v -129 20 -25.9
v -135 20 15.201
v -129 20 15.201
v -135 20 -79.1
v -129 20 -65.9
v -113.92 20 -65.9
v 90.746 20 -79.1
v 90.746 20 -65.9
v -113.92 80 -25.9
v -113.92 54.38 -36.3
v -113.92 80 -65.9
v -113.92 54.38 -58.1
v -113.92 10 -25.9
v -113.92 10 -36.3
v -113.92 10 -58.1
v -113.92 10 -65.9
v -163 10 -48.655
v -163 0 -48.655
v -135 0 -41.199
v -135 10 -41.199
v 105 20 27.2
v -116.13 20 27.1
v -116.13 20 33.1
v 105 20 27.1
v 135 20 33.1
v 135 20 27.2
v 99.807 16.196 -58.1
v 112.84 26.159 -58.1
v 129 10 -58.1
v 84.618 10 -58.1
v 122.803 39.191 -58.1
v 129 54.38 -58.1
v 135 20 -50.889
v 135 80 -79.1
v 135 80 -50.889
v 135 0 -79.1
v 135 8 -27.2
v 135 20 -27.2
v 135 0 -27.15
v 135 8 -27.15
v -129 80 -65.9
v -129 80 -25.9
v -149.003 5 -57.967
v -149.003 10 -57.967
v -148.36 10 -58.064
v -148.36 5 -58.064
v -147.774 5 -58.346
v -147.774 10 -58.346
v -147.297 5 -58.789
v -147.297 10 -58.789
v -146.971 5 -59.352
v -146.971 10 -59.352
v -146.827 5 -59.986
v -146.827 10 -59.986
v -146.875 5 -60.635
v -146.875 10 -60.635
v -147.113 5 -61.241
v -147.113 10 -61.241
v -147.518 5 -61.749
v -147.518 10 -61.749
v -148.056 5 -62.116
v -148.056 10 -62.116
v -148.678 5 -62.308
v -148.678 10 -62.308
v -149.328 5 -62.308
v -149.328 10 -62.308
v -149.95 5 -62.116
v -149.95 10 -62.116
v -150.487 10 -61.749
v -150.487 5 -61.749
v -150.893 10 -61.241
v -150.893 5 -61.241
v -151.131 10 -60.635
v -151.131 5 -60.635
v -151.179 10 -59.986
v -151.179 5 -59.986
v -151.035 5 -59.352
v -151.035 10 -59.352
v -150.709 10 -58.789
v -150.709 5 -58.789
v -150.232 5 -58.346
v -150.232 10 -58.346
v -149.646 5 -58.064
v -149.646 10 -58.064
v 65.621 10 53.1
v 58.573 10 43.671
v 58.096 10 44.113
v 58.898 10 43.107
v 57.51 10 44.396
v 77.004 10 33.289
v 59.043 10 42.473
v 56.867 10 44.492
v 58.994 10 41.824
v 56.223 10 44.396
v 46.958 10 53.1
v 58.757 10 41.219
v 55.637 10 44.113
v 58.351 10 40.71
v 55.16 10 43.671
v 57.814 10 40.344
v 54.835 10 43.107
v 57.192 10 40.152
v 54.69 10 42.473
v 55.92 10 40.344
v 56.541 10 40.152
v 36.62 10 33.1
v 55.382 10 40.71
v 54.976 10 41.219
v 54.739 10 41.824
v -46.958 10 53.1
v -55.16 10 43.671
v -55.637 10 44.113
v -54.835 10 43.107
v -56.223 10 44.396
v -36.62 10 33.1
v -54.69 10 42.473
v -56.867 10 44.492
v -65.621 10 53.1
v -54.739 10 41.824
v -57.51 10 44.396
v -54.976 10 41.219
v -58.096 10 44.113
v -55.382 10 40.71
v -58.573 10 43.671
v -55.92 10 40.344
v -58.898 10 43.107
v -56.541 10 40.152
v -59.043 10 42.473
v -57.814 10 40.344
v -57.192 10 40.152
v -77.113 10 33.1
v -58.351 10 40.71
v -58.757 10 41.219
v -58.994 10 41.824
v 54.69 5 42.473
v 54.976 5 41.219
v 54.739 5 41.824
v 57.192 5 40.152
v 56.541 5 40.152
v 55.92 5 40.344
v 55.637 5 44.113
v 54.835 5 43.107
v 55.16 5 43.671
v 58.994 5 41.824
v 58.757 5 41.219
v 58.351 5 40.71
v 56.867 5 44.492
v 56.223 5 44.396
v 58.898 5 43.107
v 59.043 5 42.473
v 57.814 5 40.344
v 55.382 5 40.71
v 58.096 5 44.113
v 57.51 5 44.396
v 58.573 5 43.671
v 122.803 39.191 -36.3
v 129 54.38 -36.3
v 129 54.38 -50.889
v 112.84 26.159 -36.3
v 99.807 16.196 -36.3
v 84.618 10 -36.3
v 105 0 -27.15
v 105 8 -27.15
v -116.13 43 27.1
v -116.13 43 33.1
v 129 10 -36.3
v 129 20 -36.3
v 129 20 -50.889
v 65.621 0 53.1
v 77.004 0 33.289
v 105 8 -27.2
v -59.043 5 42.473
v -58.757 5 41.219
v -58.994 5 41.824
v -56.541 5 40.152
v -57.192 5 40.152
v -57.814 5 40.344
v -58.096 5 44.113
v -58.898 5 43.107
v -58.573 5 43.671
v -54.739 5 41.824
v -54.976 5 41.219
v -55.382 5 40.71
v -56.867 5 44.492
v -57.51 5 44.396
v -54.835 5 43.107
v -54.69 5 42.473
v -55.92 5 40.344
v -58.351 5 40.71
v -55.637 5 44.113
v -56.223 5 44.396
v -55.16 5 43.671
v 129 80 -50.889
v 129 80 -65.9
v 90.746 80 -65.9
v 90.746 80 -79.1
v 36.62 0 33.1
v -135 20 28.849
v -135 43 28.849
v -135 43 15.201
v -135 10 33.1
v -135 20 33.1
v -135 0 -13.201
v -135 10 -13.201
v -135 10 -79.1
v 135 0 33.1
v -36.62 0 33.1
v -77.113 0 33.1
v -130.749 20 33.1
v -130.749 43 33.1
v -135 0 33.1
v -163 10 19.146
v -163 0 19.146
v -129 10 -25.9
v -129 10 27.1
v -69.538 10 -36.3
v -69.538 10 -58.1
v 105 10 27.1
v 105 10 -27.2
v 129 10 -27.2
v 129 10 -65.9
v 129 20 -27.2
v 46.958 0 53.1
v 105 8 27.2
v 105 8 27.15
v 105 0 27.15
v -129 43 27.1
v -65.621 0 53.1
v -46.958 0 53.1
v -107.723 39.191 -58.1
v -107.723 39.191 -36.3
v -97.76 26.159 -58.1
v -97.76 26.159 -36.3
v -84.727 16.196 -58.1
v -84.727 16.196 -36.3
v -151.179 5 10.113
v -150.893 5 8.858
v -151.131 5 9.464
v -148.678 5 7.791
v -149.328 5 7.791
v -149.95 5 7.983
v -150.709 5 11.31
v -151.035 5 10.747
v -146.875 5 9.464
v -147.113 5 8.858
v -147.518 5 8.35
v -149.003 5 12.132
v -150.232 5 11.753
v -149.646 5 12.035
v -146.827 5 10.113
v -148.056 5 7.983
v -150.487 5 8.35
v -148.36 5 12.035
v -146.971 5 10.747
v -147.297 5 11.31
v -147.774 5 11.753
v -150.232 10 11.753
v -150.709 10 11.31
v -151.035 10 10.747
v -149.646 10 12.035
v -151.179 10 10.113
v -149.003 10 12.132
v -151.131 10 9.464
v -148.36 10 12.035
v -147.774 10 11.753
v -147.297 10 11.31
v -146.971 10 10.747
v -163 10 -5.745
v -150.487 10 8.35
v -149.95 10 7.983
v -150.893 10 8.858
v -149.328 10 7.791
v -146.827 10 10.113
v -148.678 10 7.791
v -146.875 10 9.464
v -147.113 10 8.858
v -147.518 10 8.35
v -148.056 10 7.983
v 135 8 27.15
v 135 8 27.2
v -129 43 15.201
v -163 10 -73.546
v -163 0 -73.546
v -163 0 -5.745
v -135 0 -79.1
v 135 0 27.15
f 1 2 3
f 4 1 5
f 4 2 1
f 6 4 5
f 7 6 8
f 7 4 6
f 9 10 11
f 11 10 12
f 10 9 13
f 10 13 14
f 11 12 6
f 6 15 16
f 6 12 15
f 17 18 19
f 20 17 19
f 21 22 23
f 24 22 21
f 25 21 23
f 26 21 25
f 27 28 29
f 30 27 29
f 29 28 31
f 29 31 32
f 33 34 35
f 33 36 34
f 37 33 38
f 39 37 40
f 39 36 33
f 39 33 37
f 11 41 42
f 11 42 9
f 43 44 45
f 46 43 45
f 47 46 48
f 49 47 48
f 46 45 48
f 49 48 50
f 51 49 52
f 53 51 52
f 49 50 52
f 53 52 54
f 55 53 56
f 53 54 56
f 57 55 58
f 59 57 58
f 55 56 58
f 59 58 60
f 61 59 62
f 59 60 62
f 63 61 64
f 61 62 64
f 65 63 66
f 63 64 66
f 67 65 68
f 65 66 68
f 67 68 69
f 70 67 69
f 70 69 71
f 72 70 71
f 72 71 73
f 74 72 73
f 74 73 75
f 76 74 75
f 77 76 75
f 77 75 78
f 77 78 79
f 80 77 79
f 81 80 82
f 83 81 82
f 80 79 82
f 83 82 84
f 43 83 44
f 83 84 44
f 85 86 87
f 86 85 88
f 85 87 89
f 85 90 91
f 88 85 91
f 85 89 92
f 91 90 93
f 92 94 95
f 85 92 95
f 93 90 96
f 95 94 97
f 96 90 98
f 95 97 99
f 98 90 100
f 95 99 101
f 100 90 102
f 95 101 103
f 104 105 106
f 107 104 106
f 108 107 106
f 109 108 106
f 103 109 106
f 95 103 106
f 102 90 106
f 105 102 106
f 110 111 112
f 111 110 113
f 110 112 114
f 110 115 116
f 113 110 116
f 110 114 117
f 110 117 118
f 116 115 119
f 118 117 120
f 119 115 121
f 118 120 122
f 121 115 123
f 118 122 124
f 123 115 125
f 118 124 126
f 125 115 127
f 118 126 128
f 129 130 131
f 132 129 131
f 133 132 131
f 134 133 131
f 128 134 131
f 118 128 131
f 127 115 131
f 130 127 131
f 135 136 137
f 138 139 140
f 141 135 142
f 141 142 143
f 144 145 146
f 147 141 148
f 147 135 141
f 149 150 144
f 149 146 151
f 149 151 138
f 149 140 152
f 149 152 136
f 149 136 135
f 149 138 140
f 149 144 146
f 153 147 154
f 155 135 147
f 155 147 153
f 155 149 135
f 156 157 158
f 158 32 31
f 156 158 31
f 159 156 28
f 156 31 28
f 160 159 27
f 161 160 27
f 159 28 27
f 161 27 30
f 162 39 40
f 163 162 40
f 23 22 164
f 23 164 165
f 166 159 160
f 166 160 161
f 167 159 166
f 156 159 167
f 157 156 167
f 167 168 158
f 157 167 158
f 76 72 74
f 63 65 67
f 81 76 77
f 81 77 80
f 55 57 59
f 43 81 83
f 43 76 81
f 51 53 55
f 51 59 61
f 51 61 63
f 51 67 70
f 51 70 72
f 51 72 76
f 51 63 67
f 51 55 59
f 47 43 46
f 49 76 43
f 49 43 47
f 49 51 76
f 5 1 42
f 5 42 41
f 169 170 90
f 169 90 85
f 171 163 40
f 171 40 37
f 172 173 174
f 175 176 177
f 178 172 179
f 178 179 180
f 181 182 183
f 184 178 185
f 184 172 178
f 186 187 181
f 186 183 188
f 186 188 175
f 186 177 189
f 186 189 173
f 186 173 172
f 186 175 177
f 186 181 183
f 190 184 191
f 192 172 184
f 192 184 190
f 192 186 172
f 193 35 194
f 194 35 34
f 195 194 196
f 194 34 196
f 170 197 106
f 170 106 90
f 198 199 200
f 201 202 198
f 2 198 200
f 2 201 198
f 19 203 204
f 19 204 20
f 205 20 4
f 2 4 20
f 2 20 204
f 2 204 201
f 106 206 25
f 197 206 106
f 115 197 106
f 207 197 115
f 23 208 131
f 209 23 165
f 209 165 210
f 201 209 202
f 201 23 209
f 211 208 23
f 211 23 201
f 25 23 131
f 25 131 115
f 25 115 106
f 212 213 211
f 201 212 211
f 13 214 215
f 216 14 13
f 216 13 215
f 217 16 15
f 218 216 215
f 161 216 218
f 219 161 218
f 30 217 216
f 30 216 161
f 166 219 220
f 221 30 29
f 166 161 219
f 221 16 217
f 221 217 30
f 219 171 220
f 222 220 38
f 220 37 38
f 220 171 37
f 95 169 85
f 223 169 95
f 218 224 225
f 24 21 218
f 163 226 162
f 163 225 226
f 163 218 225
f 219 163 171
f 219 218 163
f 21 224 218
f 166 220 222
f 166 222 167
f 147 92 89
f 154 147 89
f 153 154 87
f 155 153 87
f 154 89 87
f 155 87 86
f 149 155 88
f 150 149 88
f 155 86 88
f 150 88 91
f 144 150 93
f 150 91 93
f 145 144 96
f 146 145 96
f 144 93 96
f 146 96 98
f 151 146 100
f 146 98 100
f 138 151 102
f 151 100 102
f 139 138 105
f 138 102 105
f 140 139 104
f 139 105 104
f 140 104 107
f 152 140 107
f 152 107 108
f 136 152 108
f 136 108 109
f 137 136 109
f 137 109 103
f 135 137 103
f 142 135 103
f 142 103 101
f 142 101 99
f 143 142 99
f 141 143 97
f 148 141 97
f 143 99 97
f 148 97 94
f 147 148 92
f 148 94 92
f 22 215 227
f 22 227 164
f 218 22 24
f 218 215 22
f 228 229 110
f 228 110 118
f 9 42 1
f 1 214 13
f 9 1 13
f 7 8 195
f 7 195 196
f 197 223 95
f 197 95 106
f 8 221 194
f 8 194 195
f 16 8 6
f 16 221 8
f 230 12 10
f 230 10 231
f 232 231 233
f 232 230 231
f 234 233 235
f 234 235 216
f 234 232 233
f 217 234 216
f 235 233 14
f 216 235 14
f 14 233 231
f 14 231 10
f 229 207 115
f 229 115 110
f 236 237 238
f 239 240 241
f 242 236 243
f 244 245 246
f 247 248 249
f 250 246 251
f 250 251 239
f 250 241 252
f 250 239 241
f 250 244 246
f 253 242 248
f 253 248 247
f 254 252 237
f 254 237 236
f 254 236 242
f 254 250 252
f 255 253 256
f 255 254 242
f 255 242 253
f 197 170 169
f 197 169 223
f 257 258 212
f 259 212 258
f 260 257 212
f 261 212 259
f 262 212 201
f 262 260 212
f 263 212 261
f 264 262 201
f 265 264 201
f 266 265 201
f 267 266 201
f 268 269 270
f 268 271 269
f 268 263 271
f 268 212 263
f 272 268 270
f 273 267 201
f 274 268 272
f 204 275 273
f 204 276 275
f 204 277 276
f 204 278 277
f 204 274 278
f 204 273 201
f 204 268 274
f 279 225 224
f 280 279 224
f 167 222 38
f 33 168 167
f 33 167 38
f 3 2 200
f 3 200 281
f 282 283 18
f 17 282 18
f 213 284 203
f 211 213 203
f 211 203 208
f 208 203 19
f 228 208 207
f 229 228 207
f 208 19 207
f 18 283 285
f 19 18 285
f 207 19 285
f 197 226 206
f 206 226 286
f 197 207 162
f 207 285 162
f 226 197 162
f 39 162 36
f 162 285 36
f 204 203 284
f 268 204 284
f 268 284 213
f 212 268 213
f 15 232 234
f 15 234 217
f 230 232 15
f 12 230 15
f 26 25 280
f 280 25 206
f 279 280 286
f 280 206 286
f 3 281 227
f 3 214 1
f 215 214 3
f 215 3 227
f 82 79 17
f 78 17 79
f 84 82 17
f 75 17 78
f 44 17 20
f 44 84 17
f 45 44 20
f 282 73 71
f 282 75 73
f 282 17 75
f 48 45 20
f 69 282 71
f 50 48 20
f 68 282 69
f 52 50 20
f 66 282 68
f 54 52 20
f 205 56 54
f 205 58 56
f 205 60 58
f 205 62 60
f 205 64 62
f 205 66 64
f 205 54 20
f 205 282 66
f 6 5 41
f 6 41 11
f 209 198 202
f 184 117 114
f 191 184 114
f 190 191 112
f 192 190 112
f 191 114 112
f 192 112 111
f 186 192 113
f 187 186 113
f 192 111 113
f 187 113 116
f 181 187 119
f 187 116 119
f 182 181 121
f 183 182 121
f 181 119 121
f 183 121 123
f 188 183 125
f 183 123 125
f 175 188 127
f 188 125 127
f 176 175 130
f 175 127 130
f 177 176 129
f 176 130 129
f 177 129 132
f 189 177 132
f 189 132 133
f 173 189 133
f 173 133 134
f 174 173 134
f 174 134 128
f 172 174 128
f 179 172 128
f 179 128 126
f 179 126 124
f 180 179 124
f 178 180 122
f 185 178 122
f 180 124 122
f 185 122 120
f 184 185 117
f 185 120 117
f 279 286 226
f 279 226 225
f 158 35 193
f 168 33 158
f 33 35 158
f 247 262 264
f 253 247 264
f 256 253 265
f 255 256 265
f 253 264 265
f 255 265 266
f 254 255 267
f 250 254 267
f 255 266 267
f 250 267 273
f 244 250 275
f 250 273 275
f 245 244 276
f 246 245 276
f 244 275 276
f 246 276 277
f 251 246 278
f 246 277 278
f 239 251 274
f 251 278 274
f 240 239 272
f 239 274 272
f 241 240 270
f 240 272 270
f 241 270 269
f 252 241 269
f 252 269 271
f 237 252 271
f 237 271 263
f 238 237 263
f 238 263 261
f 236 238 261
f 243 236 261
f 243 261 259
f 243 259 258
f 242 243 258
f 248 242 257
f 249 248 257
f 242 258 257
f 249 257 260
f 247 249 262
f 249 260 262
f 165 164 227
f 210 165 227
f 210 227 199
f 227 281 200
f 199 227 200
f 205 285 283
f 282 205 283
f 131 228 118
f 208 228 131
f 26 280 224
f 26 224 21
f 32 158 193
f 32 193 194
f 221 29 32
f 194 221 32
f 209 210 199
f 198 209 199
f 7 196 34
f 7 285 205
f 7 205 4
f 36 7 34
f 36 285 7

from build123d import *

# Parameters (mm, degrees)
SKETCH3_W            = 270
SKETCH3_H            = 112.2
BOSS_EXTRUDE1_DEPTH  = 20
CUT_EXTRUDE1_START   = 10
SKETCH2_W            = 258
SKETCH2_H            = 93
CUT_EXTRUDE1_DEPTH   = 30
SKETCH5_W            = 27.15
SKETCH5_H            = 8
CUT_EXTRUDE2_DEPTH   = 30
SKETCH7_W            = 27.2
SKETCH7_H            = 12
CUT_EXTRUDE3_DEPTH   = 30
BOSS_EXTRUDE6_DEPTH  = 23
BOSS_EXTRUDE7_DEPTH  = 10
SKETCH27_R           = 2.1825
CUT_EXTRUDE4_DEPTH   = 5
BOSS_EXTRUDE10_START = 7.8
BOSS_EXTRUDE10_DEPTH = 21.8
SKETCH34_W           = 15.08
SKETCH34_H           = 40
BOSS_EXTRUDE11_DEPTH = 70
BOSS_EXTRUDE12_DEPTH = 60


with BuildPart() as part:
    # Sketch3 → Boss-Extrude1 (new body)
    with BuildSketch(Plane(origin=(0, 0, 0), x_dir=(1, 0, 0), z_dir=(0, 1, 0))):
        with Locations((0, 23)):
            Rectangle(SKETCH3_W, SKETCH3_H)
    extrude(amount=BOSS_EXTRUDE1_DEPTH)

    # Sketch2 → Cut-Extrude1 (cut)
    with BuildSketch(Plane(origin=(0, 0, 0), x_dir=(1, 0, 0), z_dir=(0, 1, 0)).offset(CUT_EXTRUDE1_START)):
        with Locations((0, 19.4)):
            Rectangle(SKETCH2_W, SKETCH2_H)
    extrude(amount=CUT_EXTRUDE1_DEPTH, mode=Mode.SUBTRACT)

    # Sketch5 → Cut-Extrude2 (cut)
    with BuildSketch(Plane(origin=(135, 0, 0), x_dir=(0, 0, -1), z_dir=(1, 0, 0))):
        with Locations((13.575, 4)):
            Rectangle(SKETCH5_W, SKETCH5_H)
    cut_extrude2 = extrude(amount=-CUT_EXTRUDE2_DEPTH, mode=Mode.SUBTRACT)

    # Mirror1: Cut-Extrude2 across plane
    add(cut_extrude2.mirror(Plane.XY), mode=Mode.SUBTRACT)

    # Sketch7 → Cut-Extrude3 (cut)
    with BuildSketch(Plane(origin=(135, 0, 0), x_dir=(0, 0, -1), z_dir=(1, 0, 0))):
        with Locations((13.6, 14)):
            Rectangle(SKETCH7_W, SKETCH7_H)
    cut_extrude3 = extrude(amount=-CUT_EXTRUDE3_DEPTH, mode=Mode.SUBTRACT)

    # Mirror2: Cut-Extrude3 across plane
    add(cut_extrude3.mirror(Plane.XY), mode=Mode.SUBTRACT)

    # Sketch23 → Boss-Extrude6 (add)
    with BuildSketch(Plane(origin=(0, 20, 0), x_dir=(1, 0, 0), z_dir=(0, 1, 0))):
        Polygon((-135, -15.201290187), (-129, -15.201290187), (-129, -27.1), (-116.129520543, -27.1), (-116.129520543, -33.1), (-130.748790546, -33.1), (-135, -28.848790546), align=None)
    extrude(amount=BOSS_EXTRUDE6_DEPTH)

    # Sketch26 → Boss-Extrude7 (add)
    with BuildSketch(Plane(origin=(0, 0, 0), x_dir=(1, 0, 0), z_dir=(0, 1, 0))):
        Polygon((-135, 41.199092499), (-135, 79.1), (-163, 73.546424044), (-163, 48.655333625), align=None)
        Polygon((-135, 13.200907501), (-163, 5.744666375), (-163, -19.146424044), (-135, -33.1), align=None)
        Polygon((-77.113011714, -33.1), (-36.620106691, -33.1), (-46.95788024, -53.1), (-65.621461612, -53.1), align=None)
        Polygon((36.620106691, -33.1), (77.004264715, -33.289264282), (65.621461612, -53.1), (46.95788024, -53.1), align=None)
    extrude(amount=BOSS_EXTRUDE7_DEPTH)


with BuildPart() as boss_extrude7_piece_1:
    # of the separate pieces the step leaves, piece 1, a body of its own (boss_extrude7_pieces)
    add(part.part.solids().sort_by_distance((-135, 0, 33.1))[0])


with BuildPart() as boss_extrude7_piece_2:
    # of the separate pieces the step leaves, piece 2, a body of its own (boss_extrude7_pieces)
    add(part.part.solids().sort_by_distance((77.004264715, 0, 33.289264282))[0])


with BuildPart() as cut_extrude4_tool:
    # Sketch27 → Cut-Extrude4 (new, symmetric)
    with BuildSketch(Plane(origin=(0, 10, 0), x_dir=(1, 0, 0), z_dir=(0, 1, 0))):
        with Locations(Location((-56.866559202, -42.309979601, 0), (0, 0, 270))):
            Circle(SKETCH27_R)
        with Locations(Location((56.866559202, -42.309979601, 0), (0, 0, 270))):
            Circle(SKETCH27_R)
        with Locations(Location((-149.002974589, 60.14954625, 0), (0, 0, 270))):
            Circle(SKETCH27_R)
        with Locations(Location((-149.002974589, -9.94954625, 0), (0, 0, 270))):
            Circle(SKETCH27_R)
    extrude(amount=CUT_EXTRUDE4_DEPTH, both=True)


with BuildPart() as boss_extrude7_piece_1_1:
    add(boss_extrude7_piece_1.part)

    # Cut-Extrude4: cut by cut_extrude4_tool
    add(cut_extrude4_tool.part, mode=Mode.SUBTRACT)

    # Sketch32 → Boss-Extrude10 (add)
    with BuildSketch(Plane.XY.offset(-65.9).offset(BOSS_EXTRUDE10_START)):
        with BuildLine():
            Line((84.617950873, 10), (129, 10))
            Line((129, 10), (129, 54.379725349))
            ThreePointArc((129, 54.379725349), (112.839595195, 26.158927146), (84.617950873, 10))
        make_face()
        with BuildLine():
            Line((-69.537950873, 10), (-113.92, 10))
            Line((-113.92, 10), (-113.92, 54.379725349))
            ThreePointArc((-113.92, 54.379725349), (-97.759595195, 26.158927146), (-69.537950873, 10))
        make_face()
    extrude(amount=BOSS_EXTRUDE10_DEPTH)

    # Sketch34 → Boss-Extrude11 (add)
    with BuildSketch(Plane(origin=(0, 10, 0), x_dir=(1, 0, 0), z_dir=(0, 1, 0))):
        with Locations((-121.46, 45.9)):
            Rectangle(SKETCH34_W, SKETCH34_H)
    extrude(amount=BOSS_EXTRUDE11_DEPTH)

    # Sketch36 → Boss-Extrude12 (add)
    with BuildSketch(Plane(origin=(0, 20, 0), x_dir=(1, 0, 0), z_dir=(0, 1, 0))):
        Polygon((135, 79.1), (135, 50.889116573), (129, 50.889116573), (129, 65.9), (90.745815543, 65.9), (90.745815543, 79.1), align=None)
    extrude(amount=BOSS_EXTRUDE12_DEPTH)


with BuildPart() as boss_extrude7_piece_2_1:
    add(boss_extrude7_piece_2.part)

    # Cut-Extrude4: cut by cut_extrude4_tool
    add(cut_extrude4_tool.part, mode=Mode.SUBTRACT)


solid = Compound([boss_extrude7_piece_1_1.part, boss_extrude7_piece_2_1.part])
